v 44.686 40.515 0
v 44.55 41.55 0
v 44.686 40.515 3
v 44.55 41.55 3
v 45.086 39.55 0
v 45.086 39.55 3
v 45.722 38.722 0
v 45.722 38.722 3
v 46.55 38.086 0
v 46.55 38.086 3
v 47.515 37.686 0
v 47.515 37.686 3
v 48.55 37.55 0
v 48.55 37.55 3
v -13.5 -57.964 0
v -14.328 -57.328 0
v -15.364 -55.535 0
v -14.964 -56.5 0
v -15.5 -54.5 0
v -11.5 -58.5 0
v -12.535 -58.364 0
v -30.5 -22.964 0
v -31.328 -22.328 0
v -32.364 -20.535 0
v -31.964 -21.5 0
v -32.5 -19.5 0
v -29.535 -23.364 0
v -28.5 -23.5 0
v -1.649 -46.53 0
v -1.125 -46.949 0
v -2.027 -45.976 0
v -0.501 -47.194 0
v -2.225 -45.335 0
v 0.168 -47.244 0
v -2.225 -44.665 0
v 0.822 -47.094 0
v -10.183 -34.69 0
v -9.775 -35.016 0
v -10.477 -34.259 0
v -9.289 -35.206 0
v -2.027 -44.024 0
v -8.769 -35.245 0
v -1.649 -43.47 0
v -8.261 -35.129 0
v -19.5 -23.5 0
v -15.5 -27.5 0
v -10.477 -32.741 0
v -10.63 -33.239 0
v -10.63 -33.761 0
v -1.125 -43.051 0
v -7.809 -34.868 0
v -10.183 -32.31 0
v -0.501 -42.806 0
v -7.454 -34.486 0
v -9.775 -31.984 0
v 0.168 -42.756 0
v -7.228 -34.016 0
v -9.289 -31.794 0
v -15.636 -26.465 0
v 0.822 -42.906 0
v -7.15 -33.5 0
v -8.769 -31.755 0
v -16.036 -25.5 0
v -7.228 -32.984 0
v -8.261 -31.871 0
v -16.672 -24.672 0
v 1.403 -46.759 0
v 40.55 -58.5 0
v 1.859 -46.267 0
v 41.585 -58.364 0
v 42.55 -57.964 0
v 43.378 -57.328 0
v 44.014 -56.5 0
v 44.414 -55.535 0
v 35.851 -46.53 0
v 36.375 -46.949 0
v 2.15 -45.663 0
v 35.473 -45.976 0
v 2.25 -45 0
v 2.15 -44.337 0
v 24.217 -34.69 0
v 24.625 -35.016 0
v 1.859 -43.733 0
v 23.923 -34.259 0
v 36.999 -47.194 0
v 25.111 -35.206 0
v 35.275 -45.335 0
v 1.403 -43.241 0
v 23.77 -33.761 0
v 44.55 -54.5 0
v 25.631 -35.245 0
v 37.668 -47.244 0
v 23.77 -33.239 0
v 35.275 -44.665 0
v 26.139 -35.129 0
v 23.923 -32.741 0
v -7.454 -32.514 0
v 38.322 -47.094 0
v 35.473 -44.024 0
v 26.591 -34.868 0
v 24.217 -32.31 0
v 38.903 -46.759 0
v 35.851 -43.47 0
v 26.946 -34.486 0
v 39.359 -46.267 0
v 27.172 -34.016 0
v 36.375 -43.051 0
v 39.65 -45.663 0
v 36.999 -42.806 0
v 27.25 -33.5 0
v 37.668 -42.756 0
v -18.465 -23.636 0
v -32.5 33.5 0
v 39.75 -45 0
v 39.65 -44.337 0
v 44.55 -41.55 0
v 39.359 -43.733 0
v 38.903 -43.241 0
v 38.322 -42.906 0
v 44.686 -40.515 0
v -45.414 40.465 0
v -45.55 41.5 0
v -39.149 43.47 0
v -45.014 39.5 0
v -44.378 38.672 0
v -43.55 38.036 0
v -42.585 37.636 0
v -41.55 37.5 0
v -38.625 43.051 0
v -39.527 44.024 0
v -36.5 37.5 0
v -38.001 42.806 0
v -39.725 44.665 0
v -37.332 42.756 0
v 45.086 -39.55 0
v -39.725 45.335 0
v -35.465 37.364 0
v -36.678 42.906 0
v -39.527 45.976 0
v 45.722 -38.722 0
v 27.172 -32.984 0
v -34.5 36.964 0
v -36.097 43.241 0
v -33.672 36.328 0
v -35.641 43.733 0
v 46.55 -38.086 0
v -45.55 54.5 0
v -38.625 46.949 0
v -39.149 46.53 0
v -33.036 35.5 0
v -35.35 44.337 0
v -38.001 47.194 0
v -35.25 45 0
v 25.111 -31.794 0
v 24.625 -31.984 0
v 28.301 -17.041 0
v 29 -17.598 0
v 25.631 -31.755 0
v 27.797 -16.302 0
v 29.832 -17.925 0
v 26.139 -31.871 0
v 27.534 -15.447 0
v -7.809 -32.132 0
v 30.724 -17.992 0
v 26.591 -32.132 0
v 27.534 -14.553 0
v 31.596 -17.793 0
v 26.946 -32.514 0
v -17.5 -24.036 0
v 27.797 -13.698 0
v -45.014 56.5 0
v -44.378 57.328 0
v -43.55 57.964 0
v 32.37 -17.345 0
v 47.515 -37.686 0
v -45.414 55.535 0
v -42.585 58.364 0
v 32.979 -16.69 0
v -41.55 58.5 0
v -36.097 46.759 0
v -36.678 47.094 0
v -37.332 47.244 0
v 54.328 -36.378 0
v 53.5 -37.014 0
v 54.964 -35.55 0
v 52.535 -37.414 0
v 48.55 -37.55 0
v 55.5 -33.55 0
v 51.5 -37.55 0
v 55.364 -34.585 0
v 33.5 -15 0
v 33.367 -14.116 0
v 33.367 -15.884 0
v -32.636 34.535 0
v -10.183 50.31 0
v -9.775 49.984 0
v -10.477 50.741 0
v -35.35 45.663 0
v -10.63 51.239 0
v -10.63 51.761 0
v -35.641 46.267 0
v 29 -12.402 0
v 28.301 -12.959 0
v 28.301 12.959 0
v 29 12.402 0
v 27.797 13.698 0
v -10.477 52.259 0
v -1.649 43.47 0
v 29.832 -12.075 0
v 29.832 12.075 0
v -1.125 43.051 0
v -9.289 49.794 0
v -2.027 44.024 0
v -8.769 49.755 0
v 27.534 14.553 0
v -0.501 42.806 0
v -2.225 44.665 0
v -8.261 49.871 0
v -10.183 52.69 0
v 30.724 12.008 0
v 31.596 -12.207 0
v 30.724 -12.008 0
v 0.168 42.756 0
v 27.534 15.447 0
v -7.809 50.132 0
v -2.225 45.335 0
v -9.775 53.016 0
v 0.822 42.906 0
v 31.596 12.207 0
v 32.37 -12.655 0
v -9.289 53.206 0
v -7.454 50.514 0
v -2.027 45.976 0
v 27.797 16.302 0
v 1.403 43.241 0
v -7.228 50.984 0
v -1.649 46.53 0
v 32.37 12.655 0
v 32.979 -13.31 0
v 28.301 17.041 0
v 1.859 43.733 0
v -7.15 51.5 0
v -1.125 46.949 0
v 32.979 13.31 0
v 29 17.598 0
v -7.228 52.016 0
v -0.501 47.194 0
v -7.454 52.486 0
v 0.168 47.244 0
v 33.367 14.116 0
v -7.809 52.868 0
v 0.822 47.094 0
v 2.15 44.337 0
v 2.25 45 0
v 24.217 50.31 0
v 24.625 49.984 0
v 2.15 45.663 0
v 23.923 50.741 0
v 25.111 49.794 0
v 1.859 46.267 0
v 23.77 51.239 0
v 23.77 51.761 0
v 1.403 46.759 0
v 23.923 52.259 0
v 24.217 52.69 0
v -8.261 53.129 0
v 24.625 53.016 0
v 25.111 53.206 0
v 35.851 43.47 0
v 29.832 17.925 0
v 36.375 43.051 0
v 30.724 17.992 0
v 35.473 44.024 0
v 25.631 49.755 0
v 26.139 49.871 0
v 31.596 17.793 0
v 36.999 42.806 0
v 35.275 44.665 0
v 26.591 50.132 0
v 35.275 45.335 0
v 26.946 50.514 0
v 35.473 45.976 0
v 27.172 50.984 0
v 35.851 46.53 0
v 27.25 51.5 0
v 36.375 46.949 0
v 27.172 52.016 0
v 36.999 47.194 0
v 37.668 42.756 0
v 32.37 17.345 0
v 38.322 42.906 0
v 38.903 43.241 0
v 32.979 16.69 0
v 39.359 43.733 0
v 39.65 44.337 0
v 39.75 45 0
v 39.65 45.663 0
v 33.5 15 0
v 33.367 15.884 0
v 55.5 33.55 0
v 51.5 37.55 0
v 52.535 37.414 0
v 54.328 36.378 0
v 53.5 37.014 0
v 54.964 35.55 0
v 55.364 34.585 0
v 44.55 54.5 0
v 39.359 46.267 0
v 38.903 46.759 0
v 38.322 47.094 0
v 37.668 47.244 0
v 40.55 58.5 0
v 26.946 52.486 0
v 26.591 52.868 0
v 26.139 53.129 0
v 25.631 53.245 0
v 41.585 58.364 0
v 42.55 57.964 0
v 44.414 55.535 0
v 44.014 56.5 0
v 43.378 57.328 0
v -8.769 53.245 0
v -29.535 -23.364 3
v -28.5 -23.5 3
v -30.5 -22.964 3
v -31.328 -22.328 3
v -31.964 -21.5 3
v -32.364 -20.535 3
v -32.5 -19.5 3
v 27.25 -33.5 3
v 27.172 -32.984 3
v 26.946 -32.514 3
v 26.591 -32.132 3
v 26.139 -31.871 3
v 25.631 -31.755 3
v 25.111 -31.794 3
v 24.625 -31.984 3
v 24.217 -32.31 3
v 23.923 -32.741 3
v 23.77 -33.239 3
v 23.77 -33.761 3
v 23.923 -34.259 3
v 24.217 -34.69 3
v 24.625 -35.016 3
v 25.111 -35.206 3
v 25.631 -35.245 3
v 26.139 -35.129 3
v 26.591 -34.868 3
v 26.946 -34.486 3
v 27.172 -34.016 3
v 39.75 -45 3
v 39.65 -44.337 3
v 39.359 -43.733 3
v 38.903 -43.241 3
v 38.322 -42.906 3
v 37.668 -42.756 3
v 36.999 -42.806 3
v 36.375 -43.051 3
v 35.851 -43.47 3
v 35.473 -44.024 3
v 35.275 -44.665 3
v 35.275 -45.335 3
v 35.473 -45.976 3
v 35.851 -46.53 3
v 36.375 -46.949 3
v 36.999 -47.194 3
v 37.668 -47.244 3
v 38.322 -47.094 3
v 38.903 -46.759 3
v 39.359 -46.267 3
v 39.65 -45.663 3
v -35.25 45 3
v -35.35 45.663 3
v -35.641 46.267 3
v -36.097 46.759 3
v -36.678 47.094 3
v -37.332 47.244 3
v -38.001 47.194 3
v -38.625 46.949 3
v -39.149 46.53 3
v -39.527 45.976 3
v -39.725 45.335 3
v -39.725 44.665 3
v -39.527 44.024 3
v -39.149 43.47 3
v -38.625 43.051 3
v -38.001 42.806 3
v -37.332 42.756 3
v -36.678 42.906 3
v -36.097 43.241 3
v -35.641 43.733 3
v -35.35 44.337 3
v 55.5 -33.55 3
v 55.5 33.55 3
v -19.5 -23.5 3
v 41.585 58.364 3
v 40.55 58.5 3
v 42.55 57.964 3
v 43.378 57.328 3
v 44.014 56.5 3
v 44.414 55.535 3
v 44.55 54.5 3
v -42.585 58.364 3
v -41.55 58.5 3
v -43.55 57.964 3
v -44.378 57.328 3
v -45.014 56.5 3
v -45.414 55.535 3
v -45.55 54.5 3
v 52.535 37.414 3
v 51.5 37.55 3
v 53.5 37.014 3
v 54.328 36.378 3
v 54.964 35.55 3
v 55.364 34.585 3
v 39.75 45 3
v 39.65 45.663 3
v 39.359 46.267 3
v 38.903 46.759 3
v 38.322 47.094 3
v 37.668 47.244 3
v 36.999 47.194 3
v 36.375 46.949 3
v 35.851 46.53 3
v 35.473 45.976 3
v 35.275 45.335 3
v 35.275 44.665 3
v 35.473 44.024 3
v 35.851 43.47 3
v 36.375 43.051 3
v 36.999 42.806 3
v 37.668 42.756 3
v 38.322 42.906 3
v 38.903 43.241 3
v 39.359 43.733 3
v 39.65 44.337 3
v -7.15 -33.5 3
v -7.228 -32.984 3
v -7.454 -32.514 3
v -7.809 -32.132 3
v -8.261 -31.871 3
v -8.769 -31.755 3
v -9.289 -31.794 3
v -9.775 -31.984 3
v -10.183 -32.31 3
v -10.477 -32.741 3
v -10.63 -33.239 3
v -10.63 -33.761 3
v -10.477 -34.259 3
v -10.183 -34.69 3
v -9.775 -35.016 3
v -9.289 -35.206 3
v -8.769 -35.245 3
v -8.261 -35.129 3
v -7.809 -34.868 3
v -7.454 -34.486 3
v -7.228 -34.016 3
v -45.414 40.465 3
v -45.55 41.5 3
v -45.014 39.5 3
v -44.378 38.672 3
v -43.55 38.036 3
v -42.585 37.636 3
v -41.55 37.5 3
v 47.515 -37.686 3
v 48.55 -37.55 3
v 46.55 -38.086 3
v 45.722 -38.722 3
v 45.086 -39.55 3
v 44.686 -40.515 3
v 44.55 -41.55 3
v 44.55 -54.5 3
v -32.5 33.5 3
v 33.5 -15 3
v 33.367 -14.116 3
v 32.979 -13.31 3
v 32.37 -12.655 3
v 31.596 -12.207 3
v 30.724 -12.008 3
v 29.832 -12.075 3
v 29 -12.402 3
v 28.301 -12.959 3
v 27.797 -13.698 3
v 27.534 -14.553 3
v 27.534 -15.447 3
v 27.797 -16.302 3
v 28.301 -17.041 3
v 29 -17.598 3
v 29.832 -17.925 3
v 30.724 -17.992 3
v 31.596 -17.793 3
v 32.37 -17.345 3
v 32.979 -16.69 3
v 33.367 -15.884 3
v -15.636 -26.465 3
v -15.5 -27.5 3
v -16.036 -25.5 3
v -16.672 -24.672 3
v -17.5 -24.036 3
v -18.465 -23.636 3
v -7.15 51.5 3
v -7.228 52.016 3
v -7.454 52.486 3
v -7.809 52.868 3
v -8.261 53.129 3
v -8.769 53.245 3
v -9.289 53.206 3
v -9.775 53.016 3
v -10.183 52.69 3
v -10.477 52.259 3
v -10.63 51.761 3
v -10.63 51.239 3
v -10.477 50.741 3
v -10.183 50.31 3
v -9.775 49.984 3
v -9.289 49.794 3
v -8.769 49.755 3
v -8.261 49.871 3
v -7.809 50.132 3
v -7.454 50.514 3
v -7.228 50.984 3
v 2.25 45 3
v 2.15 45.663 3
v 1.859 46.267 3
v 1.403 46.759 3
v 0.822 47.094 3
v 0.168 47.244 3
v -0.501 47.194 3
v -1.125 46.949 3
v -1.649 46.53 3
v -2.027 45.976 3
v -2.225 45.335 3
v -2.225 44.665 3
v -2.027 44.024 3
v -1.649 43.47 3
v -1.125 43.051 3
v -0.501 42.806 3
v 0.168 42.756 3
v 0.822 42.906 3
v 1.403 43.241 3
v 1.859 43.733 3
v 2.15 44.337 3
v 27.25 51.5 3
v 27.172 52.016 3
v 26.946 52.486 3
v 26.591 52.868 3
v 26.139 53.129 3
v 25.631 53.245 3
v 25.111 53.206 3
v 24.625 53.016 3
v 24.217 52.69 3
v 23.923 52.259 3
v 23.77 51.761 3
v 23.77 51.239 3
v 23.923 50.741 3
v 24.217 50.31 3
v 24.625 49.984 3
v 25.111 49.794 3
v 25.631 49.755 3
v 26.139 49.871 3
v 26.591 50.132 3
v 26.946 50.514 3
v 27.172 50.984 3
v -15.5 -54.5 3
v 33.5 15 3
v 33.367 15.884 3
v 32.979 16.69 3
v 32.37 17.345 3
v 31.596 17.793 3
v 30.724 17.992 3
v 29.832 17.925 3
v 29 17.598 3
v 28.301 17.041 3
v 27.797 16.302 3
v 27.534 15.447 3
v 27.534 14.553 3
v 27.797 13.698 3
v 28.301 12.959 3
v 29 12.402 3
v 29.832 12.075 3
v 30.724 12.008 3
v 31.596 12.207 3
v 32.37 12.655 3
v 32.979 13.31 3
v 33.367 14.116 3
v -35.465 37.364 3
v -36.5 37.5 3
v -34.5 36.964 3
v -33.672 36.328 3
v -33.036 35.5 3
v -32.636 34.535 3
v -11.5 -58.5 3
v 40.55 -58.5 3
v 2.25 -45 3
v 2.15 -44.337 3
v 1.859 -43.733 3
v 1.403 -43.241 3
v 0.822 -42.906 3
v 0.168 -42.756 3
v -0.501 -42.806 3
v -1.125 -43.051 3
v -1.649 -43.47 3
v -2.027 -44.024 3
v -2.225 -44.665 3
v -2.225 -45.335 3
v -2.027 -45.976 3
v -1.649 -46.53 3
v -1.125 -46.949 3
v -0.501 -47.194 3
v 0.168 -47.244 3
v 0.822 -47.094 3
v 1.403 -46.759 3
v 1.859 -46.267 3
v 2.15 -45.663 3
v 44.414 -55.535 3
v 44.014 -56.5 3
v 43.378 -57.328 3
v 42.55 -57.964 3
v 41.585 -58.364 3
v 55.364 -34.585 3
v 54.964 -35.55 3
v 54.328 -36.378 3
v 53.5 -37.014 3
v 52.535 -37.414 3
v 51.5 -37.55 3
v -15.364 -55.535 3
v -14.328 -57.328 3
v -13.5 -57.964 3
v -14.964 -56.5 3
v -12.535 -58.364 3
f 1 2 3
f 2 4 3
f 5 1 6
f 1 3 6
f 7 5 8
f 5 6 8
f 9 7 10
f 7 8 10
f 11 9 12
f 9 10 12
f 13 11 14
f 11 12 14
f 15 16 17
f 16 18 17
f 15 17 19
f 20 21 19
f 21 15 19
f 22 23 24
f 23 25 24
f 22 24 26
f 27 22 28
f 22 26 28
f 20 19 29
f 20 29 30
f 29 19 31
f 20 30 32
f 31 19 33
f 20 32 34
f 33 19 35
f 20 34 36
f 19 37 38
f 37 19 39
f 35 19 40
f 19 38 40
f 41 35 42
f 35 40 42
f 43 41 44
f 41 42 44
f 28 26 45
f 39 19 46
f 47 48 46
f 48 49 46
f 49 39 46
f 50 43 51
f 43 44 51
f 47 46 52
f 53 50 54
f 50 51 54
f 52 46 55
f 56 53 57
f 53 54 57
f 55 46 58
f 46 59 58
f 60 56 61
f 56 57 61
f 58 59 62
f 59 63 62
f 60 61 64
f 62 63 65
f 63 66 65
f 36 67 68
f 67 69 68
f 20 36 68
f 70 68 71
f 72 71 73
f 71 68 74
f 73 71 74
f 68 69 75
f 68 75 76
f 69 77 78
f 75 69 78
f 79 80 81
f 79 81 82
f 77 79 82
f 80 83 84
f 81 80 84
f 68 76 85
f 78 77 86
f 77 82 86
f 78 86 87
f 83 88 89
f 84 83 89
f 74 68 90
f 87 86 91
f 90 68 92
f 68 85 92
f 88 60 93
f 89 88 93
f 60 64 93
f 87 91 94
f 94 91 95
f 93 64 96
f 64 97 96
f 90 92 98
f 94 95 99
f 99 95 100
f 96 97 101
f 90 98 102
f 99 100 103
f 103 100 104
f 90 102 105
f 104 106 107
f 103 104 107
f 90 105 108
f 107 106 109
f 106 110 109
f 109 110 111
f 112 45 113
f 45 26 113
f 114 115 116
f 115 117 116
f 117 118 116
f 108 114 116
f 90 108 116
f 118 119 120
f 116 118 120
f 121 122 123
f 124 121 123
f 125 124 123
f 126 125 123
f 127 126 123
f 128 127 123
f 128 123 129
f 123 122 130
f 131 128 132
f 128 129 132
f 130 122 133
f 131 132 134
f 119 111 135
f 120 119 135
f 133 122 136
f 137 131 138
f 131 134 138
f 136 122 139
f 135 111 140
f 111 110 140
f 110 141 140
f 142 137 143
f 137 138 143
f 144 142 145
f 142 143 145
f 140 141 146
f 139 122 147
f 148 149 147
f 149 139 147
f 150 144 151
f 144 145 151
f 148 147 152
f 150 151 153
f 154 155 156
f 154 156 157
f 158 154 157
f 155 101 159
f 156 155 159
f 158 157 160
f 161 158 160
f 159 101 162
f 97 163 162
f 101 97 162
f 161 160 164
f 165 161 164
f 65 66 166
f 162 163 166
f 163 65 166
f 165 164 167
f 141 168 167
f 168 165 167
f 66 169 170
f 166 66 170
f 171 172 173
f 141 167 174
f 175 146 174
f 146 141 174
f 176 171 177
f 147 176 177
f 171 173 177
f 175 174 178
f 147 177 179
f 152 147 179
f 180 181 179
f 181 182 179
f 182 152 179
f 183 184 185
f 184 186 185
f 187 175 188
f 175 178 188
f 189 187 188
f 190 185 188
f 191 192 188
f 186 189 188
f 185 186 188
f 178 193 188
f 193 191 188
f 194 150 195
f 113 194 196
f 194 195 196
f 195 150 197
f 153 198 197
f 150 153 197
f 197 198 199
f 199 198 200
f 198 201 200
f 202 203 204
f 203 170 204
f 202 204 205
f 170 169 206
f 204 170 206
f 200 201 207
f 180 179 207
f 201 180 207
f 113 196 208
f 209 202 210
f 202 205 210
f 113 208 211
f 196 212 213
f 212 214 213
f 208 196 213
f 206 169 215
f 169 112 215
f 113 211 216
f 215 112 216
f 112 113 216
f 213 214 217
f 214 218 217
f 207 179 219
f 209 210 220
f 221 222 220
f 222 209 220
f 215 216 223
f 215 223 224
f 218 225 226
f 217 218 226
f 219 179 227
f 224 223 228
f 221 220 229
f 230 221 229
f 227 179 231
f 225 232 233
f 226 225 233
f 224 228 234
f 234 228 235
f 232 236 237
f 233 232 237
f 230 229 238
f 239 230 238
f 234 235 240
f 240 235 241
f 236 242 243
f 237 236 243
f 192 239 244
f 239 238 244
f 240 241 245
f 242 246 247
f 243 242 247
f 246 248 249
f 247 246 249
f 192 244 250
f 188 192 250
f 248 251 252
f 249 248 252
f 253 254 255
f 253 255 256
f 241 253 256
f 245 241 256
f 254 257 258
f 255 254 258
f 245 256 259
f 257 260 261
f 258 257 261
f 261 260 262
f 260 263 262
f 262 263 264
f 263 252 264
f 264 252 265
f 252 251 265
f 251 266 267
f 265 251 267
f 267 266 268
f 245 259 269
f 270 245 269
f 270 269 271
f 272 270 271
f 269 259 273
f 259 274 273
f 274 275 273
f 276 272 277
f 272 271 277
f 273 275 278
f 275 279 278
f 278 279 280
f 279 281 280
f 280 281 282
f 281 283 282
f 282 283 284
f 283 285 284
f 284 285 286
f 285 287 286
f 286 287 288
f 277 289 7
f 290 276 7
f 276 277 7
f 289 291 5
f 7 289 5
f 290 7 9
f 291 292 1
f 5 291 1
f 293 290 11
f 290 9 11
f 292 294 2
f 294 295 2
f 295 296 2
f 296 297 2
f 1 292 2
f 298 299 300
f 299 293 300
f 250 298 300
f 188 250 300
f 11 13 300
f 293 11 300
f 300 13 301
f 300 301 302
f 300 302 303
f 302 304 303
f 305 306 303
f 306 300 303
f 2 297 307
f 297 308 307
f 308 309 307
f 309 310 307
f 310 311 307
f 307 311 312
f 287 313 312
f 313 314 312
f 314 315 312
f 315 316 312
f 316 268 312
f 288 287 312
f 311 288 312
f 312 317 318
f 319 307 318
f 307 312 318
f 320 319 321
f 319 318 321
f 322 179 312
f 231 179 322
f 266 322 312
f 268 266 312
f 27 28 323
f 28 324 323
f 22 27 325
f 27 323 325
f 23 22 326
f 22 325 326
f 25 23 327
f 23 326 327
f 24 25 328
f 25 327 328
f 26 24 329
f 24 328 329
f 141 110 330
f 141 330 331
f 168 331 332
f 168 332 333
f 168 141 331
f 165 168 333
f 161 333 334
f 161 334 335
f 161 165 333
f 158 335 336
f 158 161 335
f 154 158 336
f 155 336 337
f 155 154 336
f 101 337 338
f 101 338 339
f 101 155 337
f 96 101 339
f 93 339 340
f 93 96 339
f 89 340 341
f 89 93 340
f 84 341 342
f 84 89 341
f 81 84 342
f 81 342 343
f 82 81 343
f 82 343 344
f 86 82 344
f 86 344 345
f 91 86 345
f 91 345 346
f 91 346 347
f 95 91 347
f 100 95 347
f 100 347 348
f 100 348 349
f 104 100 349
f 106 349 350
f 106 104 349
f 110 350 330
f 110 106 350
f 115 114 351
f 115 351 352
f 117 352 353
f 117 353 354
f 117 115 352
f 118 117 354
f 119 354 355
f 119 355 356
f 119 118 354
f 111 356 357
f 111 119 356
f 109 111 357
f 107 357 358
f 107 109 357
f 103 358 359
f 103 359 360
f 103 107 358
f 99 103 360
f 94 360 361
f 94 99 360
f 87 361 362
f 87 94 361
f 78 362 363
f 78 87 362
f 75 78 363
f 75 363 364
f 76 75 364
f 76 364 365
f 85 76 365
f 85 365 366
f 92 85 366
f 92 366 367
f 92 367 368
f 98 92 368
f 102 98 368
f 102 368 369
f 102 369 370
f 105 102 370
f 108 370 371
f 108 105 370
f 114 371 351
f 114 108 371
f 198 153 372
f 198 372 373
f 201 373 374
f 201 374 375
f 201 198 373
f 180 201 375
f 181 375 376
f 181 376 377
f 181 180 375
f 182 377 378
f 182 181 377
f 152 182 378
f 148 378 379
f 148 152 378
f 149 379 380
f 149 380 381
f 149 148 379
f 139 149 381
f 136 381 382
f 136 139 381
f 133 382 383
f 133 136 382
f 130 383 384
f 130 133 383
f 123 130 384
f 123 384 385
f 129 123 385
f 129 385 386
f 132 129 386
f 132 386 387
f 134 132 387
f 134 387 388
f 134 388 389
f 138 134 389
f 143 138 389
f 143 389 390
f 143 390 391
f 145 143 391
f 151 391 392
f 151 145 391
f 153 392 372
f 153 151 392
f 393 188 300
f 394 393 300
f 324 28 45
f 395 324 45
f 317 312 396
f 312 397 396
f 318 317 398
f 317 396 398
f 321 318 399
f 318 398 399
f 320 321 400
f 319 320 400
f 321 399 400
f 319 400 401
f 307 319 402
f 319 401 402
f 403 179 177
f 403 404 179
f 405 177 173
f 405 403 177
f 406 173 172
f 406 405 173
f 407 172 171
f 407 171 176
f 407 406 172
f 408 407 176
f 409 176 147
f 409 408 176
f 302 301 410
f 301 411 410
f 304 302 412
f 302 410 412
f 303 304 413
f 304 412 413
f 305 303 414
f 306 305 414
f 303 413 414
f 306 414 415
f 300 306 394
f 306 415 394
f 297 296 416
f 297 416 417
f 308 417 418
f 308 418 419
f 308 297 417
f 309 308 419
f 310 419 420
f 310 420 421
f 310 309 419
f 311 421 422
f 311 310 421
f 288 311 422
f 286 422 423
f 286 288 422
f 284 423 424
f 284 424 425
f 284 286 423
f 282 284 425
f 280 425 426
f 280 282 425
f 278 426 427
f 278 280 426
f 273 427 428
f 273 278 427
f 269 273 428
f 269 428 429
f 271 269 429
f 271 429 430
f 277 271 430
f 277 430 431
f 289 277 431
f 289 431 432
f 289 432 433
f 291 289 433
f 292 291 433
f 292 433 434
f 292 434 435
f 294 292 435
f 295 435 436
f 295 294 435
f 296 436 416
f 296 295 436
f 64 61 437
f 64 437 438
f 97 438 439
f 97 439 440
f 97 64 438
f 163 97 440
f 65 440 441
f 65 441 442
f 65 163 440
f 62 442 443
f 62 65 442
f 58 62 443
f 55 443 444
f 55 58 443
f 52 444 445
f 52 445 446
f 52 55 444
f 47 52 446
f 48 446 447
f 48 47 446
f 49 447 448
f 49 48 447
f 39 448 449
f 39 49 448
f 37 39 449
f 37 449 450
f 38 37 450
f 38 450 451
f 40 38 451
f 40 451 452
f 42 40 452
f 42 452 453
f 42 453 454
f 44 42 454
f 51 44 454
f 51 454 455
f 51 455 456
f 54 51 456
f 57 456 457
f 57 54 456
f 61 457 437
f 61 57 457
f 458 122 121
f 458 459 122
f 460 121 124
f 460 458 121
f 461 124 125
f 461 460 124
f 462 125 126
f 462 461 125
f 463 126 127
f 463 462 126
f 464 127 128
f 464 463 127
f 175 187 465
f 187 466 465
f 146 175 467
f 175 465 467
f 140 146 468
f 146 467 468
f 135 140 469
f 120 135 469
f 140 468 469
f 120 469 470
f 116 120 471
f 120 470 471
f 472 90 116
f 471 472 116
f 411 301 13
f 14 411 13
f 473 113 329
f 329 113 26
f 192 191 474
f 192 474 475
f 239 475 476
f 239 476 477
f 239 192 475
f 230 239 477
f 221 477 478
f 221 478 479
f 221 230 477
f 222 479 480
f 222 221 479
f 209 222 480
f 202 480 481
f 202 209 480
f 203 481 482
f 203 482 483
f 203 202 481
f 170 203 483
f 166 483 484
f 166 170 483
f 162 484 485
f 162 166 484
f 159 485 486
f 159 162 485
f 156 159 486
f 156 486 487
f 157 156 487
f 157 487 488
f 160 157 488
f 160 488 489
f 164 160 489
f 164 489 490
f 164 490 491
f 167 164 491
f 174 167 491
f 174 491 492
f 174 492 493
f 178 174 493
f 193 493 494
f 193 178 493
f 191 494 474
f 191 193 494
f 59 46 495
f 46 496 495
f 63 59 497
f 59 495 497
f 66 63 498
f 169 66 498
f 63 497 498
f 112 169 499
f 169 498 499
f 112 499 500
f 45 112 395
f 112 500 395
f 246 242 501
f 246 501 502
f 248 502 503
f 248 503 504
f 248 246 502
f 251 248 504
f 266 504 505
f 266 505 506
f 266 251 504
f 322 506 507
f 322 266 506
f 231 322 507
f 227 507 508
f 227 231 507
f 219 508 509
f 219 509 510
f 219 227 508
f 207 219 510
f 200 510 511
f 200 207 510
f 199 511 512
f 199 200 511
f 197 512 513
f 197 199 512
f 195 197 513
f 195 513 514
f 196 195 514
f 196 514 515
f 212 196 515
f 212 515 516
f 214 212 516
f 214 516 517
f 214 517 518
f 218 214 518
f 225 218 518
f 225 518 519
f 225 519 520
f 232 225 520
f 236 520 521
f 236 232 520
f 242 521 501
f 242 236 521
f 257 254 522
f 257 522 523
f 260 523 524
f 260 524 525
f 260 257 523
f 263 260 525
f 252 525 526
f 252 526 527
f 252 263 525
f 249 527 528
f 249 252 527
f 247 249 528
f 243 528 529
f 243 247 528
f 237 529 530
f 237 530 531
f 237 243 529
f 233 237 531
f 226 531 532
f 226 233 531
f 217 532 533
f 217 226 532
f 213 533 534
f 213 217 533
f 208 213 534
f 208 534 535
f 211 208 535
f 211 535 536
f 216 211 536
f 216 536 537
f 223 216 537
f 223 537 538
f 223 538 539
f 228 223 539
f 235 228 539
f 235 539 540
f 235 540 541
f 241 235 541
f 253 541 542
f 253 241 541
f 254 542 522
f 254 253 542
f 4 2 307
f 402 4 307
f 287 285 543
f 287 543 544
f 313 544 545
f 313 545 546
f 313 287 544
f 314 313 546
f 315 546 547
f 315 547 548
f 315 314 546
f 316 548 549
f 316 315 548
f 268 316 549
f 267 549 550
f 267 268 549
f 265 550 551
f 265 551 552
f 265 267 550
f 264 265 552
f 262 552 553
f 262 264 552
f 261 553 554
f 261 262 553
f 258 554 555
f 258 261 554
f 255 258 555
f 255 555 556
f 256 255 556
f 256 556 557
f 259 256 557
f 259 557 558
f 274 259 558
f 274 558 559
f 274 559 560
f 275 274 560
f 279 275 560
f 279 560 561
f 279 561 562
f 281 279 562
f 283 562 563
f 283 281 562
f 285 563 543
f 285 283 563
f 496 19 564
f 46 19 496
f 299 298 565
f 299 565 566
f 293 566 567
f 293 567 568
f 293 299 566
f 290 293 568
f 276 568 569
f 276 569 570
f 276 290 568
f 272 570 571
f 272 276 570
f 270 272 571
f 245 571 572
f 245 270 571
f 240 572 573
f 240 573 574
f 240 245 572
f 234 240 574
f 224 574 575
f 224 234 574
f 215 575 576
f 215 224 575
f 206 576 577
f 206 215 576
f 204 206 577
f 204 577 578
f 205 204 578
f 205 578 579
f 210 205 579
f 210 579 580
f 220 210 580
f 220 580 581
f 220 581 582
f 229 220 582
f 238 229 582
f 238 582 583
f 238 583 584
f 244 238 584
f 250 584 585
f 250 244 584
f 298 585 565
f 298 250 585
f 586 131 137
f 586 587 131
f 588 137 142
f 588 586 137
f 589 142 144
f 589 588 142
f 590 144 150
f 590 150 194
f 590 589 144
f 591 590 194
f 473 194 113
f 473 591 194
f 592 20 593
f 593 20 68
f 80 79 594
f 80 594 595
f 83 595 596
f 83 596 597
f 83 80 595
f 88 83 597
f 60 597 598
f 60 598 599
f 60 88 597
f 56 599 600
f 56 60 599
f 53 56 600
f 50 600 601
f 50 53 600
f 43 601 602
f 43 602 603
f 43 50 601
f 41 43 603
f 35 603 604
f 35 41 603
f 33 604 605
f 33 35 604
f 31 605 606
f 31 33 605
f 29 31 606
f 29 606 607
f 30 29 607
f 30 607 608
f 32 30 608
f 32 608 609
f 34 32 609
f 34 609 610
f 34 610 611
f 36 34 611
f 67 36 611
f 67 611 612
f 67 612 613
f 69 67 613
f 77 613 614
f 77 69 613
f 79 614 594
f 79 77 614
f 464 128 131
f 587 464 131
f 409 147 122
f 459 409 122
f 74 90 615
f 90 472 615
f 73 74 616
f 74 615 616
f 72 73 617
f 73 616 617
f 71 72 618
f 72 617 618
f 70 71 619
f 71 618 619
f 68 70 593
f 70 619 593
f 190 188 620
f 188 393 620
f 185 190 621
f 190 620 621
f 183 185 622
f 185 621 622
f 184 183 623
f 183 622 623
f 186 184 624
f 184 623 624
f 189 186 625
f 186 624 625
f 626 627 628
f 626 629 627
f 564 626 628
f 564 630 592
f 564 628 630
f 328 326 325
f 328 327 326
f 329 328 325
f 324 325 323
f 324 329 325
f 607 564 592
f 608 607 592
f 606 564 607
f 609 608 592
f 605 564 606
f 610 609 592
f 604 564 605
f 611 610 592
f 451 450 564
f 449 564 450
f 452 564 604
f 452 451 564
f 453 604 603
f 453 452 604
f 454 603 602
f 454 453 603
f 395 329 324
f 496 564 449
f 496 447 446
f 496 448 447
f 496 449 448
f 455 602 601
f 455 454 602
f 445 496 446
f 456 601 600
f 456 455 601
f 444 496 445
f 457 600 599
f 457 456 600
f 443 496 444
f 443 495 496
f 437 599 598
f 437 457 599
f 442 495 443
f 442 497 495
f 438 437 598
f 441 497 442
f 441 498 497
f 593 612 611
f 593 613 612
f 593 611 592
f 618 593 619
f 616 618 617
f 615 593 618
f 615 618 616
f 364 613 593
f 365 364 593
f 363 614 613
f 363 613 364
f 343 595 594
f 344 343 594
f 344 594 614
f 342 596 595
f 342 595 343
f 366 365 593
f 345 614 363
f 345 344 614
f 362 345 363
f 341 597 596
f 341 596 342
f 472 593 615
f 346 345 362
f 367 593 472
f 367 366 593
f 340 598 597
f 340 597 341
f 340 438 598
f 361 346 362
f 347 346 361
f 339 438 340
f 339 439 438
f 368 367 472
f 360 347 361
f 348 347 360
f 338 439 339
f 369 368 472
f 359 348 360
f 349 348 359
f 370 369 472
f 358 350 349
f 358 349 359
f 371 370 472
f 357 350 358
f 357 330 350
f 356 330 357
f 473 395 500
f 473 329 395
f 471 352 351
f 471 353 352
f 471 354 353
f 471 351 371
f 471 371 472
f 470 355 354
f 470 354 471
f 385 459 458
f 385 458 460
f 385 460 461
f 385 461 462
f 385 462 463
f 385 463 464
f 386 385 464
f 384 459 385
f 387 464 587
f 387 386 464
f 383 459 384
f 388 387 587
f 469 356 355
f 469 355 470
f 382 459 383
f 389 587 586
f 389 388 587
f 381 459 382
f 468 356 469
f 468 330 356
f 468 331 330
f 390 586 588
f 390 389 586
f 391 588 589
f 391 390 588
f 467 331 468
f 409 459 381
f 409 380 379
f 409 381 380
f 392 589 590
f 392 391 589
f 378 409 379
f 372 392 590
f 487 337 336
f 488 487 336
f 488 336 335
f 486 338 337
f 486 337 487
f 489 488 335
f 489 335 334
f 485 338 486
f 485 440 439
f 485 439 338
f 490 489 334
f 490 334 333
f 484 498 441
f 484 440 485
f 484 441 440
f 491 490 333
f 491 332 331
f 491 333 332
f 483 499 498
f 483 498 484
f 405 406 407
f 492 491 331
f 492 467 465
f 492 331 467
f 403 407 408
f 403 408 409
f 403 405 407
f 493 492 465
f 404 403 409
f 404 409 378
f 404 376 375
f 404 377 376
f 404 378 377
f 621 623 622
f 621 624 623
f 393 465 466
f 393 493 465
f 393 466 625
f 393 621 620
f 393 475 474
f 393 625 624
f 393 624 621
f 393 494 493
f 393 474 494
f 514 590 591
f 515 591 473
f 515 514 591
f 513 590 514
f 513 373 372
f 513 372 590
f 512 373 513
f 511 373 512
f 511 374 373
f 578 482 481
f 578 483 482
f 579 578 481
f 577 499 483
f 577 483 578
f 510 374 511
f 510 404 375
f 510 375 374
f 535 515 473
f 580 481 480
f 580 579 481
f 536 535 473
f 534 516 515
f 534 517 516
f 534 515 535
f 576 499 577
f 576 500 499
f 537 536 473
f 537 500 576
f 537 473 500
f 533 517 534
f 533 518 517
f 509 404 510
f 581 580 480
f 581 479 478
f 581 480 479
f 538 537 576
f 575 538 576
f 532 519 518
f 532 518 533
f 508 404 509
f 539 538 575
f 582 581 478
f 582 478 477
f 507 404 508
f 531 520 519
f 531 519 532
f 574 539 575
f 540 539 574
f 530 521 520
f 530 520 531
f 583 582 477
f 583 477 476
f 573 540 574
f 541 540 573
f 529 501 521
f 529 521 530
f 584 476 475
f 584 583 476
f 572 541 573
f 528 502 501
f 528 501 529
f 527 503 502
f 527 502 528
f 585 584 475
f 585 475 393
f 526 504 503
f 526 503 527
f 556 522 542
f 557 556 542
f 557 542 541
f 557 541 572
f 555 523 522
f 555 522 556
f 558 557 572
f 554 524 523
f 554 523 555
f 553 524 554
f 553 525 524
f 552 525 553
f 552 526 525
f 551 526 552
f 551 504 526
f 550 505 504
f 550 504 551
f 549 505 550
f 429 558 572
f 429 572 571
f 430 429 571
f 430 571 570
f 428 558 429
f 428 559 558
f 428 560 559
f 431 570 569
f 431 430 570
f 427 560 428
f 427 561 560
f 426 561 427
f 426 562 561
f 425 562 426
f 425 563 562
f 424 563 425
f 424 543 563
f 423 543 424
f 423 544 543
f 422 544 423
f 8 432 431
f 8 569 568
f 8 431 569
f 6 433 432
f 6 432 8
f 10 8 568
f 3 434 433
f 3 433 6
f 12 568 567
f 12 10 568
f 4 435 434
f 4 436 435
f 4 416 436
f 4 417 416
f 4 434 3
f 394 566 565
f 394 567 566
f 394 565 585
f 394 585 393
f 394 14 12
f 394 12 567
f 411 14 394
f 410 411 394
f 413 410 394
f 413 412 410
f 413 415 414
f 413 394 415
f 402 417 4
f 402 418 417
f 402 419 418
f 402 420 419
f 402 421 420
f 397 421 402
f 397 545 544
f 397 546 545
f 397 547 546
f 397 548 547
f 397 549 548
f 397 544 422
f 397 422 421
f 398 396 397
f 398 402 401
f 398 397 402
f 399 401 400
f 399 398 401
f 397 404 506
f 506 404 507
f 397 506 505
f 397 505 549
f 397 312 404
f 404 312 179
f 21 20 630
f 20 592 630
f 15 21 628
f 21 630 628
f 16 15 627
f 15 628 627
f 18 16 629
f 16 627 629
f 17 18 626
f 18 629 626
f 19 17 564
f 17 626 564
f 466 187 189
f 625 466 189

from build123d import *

# Parameters (mm, degrees)
F1_R     = 2.25
F1_R_2   = 1.75
F1_R_3   = 3
F2_DEPTH = 3
F3_W     = 17
F3_H     = 35
F4_DEPTH = 3.001
F5_R     = 4


with BuildPart() as f2:
    # F1 (on Top) → F2 (new body)
    with BuildSketch(Plane.XY):
        Polygon((44.55, 58.5), (-32.5, 58.5), (-45.55, 58.5), (-45.55, 37.5), (-32.5, 37.5), (-32.5, 0), (-32.5, -58.5), (44.55, -58.5), (44.55, -37.55), (55.5, -37.55), (55.5, 37.55), (44.55, 37.55), align=None)
        with Locations((0, -45)):
            Circle(F1_R, mode=Mode.SUBTRACT)
        with Locations((-8.9, -33.5)):
            Circle(F1_R_2, mode=Mode.SUBTRACT)
        with Locations((25.5, -33.5)):
            Circle(F1_R_2, mode=Mode.SUBTRACT)
        with Locations((37.5, -45)):
            Circle(F1_R, mode=Mode.SUBTRACT)
        with Locations((30.5, -15)):
            Circle(F1_R_3, mode=Mode.SUBTRACT)
        with Locations((-37.5, 45)):
            Circle(F1_R, mode=Mode.SUBTRACT)
        with Locations((-8.9, 51.5)):
            Circle(F1_R_2, mode=Mode.SUBTRACT)
        with Locations((0, 45)):
            Circle(F1_R, mode=Mode.SUBTRACT)
        with Locations((30.5, 15)):
            Circle(F1_R_3, mode=Mode.SUBTRACT)
        with Locations((25.5, 51.5)):
            Circle(F1_R_2, mode=Mode.SUBTRACT)
        with Locations((37.5, 45)):
            Circle(F1_R, mode=Mode.SUBTRACT)
    extrude(amount=F2_DEPTH)

    # F3 (on Top) → F4 (cut, through all)
    with BuildSketch(Plane.XY):
        with Locations((-24, -41)):
            Rectangle(F3_W, F3_H)
    extrude(amount=F4_DEPTH, mode=Mode.SUBTRACT)

    # F5
    f5_edges = [f2.edges().sort_by_distance(p)[0] for p in [
        (-45.55, 37.5, 1.5),
        (-45.55, 58.5, 1.5),
        (-32.5, 37.5, 1.5),
        (-32.5, -23.5, 1.5),
        (-15.5, -58.5, 1.5),
        (-15.5, -23.5, 1.5),
        (44.55, -58.5, 1.5),
        (44.55, -37.55, 1.5),
        (55.5, -37.55, 1.5),
        (55.5, 37.55, 1.5),
        (44.55, 37.55, 1.5),
        (44.55, 58.5, 1.5),
    ]]
    fillet(f5_edges, radius=F5_R)


solid = f2.part
